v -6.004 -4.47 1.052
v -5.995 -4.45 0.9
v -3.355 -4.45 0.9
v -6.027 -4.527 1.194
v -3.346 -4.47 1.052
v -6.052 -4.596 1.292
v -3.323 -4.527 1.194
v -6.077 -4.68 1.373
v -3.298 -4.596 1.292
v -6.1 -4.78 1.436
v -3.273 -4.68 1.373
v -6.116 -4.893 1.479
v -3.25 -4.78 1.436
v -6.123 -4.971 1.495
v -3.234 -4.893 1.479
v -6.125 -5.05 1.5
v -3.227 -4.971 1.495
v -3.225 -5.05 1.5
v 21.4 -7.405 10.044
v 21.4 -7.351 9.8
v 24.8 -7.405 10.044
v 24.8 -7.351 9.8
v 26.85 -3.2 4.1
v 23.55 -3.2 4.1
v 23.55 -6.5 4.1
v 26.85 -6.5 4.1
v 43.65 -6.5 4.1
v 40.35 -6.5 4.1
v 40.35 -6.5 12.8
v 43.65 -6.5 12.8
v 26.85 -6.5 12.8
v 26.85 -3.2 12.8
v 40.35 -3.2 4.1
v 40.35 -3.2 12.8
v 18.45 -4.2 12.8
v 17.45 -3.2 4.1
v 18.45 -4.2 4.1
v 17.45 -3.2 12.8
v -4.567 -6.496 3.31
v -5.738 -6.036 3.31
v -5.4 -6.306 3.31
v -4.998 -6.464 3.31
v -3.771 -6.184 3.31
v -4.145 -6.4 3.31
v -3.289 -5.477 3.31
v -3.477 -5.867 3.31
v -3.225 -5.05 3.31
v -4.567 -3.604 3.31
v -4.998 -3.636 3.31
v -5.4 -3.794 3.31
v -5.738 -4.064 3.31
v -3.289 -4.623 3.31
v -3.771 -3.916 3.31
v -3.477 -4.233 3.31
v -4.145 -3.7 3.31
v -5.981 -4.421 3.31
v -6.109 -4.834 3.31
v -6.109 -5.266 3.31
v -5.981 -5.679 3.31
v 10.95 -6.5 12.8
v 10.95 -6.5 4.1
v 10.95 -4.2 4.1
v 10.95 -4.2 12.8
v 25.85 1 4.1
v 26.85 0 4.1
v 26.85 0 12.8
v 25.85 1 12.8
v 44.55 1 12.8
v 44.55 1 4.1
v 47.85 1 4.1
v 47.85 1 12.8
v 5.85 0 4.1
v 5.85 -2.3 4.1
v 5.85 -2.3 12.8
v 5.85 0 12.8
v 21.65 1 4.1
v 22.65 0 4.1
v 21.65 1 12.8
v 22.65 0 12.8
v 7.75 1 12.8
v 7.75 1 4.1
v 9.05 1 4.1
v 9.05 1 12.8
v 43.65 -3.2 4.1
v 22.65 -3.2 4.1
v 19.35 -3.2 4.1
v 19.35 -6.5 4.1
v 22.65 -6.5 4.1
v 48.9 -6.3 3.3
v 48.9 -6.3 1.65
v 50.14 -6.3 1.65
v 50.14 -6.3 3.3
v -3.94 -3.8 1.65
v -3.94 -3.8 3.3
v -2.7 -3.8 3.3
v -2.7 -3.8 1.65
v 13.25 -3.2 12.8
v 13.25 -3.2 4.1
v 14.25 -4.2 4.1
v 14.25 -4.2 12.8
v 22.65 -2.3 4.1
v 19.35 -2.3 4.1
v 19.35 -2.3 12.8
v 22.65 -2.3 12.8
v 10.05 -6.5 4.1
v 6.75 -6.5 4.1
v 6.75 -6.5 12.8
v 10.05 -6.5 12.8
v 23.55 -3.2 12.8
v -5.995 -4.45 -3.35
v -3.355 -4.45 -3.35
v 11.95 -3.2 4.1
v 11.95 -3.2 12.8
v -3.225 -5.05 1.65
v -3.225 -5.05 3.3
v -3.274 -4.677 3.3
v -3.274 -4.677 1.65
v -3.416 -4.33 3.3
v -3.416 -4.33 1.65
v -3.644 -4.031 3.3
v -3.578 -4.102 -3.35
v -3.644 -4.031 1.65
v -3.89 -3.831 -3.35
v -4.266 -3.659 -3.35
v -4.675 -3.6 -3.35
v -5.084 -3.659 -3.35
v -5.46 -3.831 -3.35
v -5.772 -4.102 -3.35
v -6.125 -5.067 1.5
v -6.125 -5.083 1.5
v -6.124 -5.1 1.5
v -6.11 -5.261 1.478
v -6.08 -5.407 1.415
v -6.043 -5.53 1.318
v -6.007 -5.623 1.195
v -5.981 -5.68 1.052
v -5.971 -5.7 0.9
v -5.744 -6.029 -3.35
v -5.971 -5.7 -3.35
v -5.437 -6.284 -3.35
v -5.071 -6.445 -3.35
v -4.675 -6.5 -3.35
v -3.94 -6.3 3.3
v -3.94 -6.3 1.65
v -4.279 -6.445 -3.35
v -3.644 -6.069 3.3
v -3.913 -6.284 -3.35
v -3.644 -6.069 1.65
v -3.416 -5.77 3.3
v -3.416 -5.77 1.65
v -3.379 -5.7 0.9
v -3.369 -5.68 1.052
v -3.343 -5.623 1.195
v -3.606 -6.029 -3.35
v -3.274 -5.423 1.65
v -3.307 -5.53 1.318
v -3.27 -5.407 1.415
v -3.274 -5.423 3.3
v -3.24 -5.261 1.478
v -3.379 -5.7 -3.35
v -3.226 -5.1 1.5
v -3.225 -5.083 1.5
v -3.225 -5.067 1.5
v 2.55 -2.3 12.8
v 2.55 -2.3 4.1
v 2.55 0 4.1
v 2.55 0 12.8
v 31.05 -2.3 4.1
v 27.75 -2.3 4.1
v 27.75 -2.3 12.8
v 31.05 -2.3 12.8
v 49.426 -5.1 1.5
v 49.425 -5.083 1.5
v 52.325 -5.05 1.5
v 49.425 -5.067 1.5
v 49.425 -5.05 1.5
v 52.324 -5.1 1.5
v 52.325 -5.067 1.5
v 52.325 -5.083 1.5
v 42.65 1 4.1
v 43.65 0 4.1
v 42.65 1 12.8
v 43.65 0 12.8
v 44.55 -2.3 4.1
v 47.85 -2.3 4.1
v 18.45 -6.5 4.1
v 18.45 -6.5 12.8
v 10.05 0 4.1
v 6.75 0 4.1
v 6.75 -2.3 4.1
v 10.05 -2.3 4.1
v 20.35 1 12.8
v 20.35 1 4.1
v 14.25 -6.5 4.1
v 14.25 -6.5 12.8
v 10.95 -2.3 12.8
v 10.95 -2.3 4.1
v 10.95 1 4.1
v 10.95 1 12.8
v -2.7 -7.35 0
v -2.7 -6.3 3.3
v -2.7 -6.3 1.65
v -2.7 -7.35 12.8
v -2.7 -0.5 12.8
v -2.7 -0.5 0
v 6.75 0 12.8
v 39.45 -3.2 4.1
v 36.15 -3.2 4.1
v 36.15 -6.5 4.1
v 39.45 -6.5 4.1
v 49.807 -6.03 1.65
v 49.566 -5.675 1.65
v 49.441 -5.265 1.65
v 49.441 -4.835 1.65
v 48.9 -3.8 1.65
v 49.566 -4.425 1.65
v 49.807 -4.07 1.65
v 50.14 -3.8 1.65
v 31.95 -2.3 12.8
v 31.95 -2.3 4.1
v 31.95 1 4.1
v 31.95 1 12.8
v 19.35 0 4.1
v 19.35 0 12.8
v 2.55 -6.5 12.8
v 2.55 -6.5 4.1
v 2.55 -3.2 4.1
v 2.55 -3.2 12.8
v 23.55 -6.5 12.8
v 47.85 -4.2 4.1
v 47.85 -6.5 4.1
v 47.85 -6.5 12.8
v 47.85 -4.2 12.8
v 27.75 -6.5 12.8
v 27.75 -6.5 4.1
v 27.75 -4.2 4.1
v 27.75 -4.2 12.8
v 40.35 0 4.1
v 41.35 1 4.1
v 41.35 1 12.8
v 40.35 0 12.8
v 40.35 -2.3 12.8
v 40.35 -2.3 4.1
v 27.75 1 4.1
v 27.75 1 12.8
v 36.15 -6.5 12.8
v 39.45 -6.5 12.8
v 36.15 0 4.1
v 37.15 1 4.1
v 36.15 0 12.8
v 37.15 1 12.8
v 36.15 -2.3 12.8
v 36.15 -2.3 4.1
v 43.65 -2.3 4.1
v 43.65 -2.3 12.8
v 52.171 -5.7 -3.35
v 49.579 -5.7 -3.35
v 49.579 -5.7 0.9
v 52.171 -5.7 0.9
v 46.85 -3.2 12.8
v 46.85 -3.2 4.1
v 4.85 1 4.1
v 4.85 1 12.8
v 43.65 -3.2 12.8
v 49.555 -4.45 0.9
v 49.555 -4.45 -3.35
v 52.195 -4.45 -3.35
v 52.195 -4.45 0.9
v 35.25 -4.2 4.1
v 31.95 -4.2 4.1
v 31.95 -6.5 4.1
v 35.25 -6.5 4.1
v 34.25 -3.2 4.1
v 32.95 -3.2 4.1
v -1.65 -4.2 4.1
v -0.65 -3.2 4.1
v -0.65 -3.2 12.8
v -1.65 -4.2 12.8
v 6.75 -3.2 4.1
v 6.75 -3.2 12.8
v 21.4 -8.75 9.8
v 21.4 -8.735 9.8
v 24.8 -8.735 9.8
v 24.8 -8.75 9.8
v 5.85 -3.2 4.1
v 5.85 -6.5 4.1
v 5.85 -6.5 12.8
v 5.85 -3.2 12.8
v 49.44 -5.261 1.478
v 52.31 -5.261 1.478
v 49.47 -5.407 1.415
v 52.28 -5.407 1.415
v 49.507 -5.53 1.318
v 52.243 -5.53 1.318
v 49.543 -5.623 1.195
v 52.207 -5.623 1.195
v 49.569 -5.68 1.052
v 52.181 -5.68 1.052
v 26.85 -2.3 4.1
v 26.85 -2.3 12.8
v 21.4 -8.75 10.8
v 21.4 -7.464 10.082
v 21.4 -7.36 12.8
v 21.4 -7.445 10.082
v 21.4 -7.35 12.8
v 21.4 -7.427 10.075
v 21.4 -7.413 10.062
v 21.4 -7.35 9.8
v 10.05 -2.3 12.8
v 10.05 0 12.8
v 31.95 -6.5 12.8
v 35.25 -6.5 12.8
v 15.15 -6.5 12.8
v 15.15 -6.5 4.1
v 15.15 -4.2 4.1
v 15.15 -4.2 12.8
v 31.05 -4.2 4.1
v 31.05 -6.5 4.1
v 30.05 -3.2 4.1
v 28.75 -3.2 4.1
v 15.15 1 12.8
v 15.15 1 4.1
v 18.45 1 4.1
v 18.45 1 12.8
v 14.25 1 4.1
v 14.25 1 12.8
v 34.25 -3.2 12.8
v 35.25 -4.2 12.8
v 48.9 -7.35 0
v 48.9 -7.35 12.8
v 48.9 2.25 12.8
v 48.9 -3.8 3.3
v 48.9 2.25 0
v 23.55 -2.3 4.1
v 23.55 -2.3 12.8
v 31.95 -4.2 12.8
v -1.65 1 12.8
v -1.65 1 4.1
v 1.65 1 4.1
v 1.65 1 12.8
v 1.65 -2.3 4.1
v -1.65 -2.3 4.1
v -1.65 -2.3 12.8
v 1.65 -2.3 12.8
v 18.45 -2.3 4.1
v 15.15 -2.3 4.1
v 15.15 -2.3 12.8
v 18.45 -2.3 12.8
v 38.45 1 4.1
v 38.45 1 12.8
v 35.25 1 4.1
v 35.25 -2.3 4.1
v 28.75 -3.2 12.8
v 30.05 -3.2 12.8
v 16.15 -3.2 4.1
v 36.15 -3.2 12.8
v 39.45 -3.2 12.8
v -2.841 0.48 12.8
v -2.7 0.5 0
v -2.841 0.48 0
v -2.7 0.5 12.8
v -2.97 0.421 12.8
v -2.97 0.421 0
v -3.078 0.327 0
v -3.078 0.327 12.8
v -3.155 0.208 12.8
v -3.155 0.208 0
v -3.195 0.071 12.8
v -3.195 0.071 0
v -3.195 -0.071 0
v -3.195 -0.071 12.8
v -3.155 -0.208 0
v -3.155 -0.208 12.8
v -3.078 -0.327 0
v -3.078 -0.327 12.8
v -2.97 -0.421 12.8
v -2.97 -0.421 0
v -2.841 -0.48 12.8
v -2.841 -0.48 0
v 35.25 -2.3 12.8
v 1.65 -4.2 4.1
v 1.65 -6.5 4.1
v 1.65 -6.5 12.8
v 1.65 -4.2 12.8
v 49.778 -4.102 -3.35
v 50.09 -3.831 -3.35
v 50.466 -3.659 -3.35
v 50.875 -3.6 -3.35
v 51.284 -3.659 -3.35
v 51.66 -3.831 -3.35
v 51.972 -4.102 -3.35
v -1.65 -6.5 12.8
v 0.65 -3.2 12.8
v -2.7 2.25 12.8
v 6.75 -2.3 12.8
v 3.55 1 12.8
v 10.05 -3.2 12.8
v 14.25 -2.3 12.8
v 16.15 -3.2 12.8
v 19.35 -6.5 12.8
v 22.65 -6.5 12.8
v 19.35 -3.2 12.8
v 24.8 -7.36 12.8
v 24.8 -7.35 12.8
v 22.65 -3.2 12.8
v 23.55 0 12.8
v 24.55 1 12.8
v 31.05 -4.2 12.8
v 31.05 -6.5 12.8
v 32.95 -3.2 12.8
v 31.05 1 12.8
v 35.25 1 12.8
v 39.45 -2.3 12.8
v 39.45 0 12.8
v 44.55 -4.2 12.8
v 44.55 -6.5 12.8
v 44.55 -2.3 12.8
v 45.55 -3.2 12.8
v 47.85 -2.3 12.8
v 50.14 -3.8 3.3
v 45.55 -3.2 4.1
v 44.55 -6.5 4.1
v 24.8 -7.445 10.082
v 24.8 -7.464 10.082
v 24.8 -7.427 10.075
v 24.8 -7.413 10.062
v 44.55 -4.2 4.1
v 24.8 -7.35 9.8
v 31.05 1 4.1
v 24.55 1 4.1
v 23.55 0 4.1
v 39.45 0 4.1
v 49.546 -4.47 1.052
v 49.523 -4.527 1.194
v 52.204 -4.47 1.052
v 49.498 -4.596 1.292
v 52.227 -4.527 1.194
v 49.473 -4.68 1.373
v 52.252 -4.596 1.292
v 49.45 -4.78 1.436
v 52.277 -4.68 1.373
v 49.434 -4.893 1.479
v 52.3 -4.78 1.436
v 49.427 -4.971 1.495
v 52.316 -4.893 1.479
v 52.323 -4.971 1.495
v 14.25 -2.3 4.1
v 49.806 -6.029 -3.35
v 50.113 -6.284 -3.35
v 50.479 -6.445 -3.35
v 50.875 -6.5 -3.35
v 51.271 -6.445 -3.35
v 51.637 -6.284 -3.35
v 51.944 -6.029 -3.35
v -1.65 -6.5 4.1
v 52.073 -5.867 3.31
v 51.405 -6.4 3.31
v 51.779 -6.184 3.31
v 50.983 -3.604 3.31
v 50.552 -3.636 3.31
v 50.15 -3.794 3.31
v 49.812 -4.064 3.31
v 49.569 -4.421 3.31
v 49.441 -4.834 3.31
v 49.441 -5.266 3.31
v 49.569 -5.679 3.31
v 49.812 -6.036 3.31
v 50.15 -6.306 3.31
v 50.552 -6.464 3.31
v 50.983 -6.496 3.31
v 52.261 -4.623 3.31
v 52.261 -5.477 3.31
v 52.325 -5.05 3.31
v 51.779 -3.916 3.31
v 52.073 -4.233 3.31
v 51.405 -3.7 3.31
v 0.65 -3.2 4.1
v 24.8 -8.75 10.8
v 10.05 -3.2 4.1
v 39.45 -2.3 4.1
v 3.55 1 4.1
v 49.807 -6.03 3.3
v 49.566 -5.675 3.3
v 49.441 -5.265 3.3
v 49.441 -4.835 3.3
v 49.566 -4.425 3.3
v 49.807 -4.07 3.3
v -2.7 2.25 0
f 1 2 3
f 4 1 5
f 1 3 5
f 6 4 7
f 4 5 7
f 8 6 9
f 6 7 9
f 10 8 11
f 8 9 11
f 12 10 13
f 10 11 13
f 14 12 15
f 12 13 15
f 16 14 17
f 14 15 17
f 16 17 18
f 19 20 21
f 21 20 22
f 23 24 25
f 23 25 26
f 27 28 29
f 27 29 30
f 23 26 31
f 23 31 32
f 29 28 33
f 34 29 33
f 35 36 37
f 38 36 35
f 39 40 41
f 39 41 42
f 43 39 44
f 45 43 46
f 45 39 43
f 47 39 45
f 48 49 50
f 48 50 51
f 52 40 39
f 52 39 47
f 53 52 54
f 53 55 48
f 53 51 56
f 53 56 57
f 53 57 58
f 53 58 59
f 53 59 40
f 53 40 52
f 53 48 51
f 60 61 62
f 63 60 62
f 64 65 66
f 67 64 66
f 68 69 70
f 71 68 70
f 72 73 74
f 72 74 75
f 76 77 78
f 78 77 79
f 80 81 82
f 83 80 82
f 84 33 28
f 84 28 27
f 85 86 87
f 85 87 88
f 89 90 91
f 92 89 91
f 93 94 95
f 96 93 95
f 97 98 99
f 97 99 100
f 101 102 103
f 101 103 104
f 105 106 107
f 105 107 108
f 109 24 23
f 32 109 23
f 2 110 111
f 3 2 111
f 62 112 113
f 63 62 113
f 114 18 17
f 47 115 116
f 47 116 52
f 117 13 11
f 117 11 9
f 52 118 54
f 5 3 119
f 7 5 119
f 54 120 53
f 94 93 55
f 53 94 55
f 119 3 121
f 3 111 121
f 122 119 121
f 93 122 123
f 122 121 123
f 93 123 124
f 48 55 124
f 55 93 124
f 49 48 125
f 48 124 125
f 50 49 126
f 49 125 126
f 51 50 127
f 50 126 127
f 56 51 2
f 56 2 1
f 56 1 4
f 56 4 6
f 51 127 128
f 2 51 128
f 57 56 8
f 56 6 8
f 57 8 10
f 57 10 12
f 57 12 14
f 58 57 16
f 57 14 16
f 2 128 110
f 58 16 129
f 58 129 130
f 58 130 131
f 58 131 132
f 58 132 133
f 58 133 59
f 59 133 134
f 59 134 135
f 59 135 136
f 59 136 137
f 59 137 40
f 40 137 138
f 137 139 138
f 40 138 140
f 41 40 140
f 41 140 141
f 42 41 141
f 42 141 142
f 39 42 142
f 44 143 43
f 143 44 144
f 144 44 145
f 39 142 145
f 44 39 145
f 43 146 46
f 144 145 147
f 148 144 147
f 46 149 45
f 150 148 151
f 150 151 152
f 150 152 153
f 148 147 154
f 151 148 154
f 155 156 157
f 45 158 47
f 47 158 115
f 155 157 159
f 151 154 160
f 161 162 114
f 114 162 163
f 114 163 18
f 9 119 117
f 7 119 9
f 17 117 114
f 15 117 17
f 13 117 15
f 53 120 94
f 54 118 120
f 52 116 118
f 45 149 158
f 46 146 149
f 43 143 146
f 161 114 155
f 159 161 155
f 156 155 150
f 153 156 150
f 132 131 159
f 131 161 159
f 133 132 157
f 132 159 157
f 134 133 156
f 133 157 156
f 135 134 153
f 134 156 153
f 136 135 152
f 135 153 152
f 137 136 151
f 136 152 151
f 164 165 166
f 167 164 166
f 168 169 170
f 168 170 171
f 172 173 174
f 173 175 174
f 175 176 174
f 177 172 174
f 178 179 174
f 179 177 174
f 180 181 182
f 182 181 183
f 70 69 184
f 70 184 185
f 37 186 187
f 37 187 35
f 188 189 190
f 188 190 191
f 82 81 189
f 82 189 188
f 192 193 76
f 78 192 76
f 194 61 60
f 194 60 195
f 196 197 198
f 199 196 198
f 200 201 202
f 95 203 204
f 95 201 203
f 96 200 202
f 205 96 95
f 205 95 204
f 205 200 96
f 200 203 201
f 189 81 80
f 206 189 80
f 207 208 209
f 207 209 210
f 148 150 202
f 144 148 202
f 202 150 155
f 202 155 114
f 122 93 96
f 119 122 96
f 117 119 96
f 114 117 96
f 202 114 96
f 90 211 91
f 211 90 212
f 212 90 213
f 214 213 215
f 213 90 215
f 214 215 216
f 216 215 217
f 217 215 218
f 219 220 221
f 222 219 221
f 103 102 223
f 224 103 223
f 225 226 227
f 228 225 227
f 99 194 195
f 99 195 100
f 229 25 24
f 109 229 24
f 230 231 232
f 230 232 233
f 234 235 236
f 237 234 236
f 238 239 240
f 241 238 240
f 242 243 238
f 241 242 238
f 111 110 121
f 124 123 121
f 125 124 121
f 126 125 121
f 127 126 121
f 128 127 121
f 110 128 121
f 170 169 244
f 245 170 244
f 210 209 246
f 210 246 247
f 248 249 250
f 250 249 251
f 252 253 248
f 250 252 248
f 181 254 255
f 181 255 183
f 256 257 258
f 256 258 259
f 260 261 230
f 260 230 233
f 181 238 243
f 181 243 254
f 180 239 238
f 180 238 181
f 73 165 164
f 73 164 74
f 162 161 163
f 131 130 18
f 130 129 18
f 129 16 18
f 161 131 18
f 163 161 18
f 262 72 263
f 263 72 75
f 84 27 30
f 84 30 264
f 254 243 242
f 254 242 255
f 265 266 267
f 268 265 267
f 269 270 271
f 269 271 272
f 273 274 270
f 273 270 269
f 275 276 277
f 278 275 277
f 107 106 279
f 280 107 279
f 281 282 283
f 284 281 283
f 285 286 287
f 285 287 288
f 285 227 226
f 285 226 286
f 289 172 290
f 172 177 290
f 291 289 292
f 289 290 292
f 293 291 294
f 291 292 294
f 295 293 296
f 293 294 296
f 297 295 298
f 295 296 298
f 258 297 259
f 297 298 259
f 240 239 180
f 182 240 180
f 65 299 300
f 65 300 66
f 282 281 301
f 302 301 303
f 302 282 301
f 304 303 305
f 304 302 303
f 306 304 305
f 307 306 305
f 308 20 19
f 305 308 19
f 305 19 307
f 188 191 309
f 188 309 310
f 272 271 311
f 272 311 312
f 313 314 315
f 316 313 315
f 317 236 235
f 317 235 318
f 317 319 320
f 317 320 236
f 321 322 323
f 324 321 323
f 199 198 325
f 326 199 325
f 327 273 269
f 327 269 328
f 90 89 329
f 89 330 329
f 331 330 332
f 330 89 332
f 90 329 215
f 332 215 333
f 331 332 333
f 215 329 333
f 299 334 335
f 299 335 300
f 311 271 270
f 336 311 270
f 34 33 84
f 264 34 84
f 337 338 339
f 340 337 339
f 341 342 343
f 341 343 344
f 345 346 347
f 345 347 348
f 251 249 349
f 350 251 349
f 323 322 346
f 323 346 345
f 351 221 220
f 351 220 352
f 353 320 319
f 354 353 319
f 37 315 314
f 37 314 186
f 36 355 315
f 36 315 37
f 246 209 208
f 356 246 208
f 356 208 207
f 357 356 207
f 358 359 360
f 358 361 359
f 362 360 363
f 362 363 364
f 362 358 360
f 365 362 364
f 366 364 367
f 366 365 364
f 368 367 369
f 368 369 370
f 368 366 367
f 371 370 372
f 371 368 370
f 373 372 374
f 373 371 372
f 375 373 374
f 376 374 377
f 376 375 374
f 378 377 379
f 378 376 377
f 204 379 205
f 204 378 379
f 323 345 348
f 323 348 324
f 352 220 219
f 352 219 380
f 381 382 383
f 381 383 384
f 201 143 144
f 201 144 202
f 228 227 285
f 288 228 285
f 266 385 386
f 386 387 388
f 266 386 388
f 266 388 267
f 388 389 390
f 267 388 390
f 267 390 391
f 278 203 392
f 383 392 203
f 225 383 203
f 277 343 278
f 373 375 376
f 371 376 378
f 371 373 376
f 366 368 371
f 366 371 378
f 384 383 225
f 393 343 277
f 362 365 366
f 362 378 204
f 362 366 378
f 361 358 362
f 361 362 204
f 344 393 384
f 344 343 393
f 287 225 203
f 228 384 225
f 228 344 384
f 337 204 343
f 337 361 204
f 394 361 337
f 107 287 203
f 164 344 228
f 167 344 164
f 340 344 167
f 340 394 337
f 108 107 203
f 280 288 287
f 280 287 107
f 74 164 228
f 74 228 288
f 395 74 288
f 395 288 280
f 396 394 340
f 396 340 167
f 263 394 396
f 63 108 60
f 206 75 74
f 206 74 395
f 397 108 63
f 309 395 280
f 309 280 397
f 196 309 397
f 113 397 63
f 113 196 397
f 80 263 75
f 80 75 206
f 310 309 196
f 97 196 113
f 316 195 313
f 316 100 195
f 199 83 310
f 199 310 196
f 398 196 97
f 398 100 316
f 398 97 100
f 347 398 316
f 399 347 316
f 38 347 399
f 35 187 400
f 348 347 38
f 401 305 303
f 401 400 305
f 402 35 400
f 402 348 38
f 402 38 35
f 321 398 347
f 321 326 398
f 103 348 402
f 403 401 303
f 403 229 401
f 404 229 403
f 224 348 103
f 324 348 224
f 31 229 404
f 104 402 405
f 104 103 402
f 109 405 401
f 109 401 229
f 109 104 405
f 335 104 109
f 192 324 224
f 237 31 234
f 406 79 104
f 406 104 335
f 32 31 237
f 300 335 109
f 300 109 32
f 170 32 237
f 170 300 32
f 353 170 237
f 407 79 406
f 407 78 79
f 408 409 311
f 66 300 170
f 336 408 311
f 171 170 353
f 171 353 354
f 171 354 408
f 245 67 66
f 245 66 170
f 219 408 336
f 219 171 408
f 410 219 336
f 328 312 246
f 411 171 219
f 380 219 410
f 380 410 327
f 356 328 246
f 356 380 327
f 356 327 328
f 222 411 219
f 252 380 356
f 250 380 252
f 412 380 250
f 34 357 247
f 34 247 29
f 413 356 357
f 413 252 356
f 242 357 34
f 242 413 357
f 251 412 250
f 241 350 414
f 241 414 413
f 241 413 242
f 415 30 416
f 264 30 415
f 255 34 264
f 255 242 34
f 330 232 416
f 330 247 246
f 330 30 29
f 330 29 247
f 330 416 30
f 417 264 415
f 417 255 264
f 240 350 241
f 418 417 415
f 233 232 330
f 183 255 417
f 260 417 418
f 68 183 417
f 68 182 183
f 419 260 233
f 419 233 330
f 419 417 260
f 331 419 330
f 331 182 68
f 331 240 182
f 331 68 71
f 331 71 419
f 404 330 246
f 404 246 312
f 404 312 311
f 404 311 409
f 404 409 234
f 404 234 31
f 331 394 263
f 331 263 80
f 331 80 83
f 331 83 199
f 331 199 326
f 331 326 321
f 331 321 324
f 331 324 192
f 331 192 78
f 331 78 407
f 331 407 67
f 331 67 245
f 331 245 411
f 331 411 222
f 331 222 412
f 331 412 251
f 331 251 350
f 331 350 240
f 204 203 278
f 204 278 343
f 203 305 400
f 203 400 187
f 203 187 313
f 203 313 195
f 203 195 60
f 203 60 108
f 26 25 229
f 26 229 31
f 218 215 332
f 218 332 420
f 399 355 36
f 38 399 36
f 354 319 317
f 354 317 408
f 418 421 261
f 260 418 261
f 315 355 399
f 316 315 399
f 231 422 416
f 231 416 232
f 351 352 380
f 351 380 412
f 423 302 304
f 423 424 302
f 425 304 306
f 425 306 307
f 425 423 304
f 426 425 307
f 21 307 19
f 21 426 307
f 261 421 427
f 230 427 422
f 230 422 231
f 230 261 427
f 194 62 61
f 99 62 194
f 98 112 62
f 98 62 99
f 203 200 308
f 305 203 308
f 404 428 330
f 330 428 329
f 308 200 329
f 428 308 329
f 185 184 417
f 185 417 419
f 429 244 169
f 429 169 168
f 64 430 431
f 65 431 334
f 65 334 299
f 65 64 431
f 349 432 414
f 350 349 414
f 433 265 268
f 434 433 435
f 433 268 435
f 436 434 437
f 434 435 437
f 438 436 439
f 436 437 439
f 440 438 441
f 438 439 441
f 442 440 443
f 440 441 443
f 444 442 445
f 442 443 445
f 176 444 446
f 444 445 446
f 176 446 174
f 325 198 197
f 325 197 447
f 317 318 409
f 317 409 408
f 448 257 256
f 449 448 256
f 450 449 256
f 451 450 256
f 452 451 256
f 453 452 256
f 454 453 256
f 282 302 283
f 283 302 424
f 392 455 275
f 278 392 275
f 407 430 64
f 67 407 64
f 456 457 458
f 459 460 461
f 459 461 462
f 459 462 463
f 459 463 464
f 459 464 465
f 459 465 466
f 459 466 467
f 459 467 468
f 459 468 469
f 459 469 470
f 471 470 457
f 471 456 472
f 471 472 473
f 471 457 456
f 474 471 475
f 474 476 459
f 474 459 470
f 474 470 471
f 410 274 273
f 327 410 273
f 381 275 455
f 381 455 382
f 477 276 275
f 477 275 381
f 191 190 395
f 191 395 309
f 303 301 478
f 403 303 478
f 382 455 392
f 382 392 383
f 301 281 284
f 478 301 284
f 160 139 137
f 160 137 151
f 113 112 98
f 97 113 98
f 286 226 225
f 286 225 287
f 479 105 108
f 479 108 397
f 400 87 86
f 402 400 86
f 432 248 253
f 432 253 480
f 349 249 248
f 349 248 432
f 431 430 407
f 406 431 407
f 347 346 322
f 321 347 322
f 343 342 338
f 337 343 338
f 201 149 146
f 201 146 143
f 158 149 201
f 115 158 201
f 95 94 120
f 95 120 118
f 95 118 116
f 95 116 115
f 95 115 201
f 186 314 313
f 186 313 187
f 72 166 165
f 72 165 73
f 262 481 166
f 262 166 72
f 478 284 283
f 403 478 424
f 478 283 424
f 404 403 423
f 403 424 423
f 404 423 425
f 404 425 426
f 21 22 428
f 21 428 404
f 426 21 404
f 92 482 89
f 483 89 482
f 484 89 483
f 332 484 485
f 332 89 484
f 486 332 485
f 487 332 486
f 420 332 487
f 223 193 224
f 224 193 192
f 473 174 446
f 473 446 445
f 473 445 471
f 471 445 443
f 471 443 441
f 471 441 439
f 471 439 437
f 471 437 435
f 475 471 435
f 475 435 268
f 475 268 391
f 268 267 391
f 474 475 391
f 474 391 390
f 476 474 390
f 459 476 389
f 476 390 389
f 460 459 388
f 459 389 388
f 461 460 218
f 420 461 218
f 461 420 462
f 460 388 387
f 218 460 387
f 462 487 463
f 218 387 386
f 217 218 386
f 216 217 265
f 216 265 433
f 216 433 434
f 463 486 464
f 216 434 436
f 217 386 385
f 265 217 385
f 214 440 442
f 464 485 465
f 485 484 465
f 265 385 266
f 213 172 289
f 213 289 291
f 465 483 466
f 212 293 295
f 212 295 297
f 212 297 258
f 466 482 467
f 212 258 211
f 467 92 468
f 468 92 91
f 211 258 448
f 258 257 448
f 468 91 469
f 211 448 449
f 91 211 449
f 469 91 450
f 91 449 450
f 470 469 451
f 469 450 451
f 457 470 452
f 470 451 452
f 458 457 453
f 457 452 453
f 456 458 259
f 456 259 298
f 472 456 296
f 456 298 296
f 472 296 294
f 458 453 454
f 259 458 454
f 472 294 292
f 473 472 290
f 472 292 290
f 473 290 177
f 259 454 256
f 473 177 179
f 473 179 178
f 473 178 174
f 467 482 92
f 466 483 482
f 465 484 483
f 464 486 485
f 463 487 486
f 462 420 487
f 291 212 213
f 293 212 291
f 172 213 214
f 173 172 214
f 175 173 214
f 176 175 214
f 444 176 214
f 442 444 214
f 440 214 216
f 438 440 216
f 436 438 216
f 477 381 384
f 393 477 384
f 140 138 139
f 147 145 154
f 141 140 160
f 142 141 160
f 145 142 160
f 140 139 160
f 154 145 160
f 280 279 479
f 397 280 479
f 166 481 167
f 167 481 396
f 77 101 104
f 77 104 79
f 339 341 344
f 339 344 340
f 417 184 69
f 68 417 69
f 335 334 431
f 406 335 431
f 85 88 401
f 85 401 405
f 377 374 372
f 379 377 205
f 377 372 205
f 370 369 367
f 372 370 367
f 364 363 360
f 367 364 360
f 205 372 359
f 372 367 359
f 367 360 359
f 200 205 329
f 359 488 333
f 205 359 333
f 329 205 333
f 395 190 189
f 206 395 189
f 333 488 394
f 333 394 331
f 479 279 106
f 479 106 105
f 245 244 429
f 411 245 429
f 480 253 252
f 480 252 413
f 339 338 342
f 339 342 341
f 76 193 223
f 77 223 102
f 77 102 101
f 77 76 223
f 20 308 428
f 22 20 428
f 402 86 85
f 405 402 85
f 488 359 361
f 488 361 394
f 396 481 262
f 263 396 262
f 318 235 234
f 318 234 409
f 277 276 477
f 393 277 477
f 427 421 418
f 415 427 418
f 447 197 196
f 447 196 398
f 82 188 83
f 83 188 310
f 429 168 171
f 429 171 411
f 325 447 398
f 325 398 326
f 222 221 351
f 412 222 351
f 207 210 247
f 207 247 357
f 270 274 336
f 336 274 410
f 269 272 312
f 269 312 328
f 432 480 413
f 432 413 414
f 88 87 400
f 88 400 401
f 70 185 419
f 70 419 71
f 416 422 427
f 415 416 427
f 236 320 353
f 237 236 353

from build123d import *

# Parameters (mm, degrees)
BOX_W                  = 51.6
BOX_H                  = 9.6
BOX_DEPTH              = 12.8
BOX001_W               = 3.4
BOX001_H               = 1.4
BOX001_DEPTH           = 3
CHAMFER_SIZE2          = 2
CHAMFER_SIZE           = 1.39
BOX002_W               = 3.4
BOX002_H               = 1.5
BOX002_DEPTH           = 0.3
FILLET_R               = 0.05
BOX006_W               = 1.5
BOX006_H               = 2.5
BOX006_DEPTH           = 1.65
CYLINDER_R             = 1.45
CYLINDER_DEPTH         = 6.66
BOX007_W               = 1.5
BOX007_H               = 2.5
BOX007_DEPTH           = 1.65
CYLINDER001_R          = 1.45
CYLINDER001_DEPTH      = 6.66
BOX003_W               = 3.3
BOX003_H               = 3.3
BOX003_DEPTH           = 8.75
LINEARPATTERN_COUNT    = 12
LINEARPATTERN_PITCH    = 4.2
BOX008_W               = 3.3
BOX008_H               = 3.3
BOX008_DEPTH           = 8.75
LINEARPATTERN001_COUNT = 12
LINEARPATTERN001_PITCH = 4.2
CHAMFER001_SIZE        = 1
CYLINDER002_W          = 0.5
CYLINDER002_H          = 12.8
CYLINDER002_ANGLE      = 180
BOX009_W               = 3
BOX009_H               = 1.25
BOX009_DEPTH           = 5
LINEARPATTERN002_COUNT = 2
LINEARPATTERN002_PITCH = 55.54
FILLET001_R            = 0.6


with BuildPart() as part:
    # Box → Box (join)
    with BuildSketch(Plane(origin=(-2.7, -7.35, 0), x_dir=(1, 0, 0), z_dir=(0, 0, 1))):
        with Locations((25.8, 4.8)):
            Rectangle(BOX_W, BOX_H)
    extrude(amount=BOX_DEPTH)

    # Box001 → Box001 (join)
    with BuildSketch(Plane(origin=(21.4, -8.75, 9.8), x_dir=(1, 0, 0), z_dir=(0, 0, 1))):
        with Locations((1.7, 0.7)):
            Rectangle(BOX001_W, BOX001_H)
    extrude(amount=BOX001_DEPTH)

    # Chamfer
    chamfer_edges = [part.edges().sort_by_distance(p)[0] for p in [
        (23.1, -8.75, 12.8),
    ]]
    chamfer_side = part.faces().sort_by_distance((23.1, -8.05, 12.8))[0]
    chamfer(chamfer_edges, length=CHAMFER_SIZE, length2=CHAMFER_SIZE2, reference=chamfer_side)

    # Box002 → Box002 (cut)
    with BuildSketch(Plane(origin=(21.4, -8.815, 9.475), x_dir=(1, 0, 0), z_dir=(0, -0.21644, 0.976296))):
        with Locations((1.7, 0.75)):
            Rectangle(BOX002_W, BOX002_H)
    extrude(amount=BOX002_DEPTH, mode=Mode.SUBTRACT)

    # Fillet
    fillet_edges = [part.edges().sort_by_distance(p)[0] for p in [
        (23.1, -7.415488, 10.092548),
    ]]
    fillet(fillet_edges, radius=FILLET_R)

    # Box006 → Box006 (join)
    with BuildSketch(Plane(origin=(-4.2, -6.3, 1.65), x_dir=(1, 0, 0), z_dir=(0, 0, 1))):
        with Locations((0.75, 1.25)):
            Rectangle(BOX006_W, BOX006_H)
    extrude(amount=BOX006_DEPTH)

    # Cylinder → Cylinder (join)
    with BuildSketch(Plane(origin=(-4.675, -5.05, -3.35), x_dir=(1, 0, 0), z_dir=(0, 0, 1))):
        Circle(CYLINDER_R)
    extrude(amount=CYLINDER_DEPTH)

    # Box007 → Box007 (join)
    with BuildSketch(Plane(origin=(48.9, -6.3, 1.65), x_dir=(1, 0, 0), z_dir=(0, 0, 1))):
        with Locations((0.75, 1.25)):
            Rectangle(BOX007_W, BOX007_H)
    extrude(amount=BOX007_DEPTH)

    # Cylinder001 → Cylinder001 (join)
    with BuildSketch(Plane(origin=(50.875, -5.05, -3.35), x_dir=(1, 0, 0), z_dir=(0, 0, 1))):
        Circle(CYLINDER001_R)
    extrude(amount=CYLINDER001_DEPTH)

    # Box003 → Box003 (cut)
    with BuildSketch(Plane(origin=(-1.65, -2.3, 4.1), x_dir=(1, 0, 0), z_dir=(0, 0, 1))):
        with Locations((1.65, 1.65)):
            Rectangle(BOX003_W, BOX003_H)
    box003 = extrude(amount=BOX003_DEPTH, mode=Mode.SUBTRACT)

    # LinearPattern: Box003 ×12
    with Locations(*[(i * LINEARPATTERN_PITCH, 0, 0) for i in range(1, LINEARPATTERN_COUNT)]):
        add(box003, mode=Mode.SUBTRACT)

    # Box008 → Box008 (cut)
    with BuildSketch(Plane(origin=(-1.65, -6.5, 4.1), x_dir=(1, 0, 0), z_dir=(0, 0, 1))):
        with Locations((1.65, 1.65)):
            Rectangle(BOX008_W, BOX008_H)
    box008 = extrude(amount=BOX008_DEPTH, mode=Mode.SUBTRACT)

    # LinearPattern001: Box008 ×12
    with Locations(*[(i * LINEARPATTERN001_PITCH, 0, 0) for i in range(1, LINEARPATTERN001_COUNT)]):
        add(box008, mode=Mode.SUBTRACT)

    # Chamfer001
    chamfer001_edges = [part.edges().sort_by_distance(p)[0] for p in [
        (2.55, 1, 8.45),
        (-1.65, -3.2, 8.45),
        (5.85, 1, 8.45),
        (1.65, -3.2, 8.45),
        (14.25, -3.2, 8.45),
        (10.95, -3.2, 8.45),
        (31.95, -3.2, 8.45),
        (40.35, 1, 8.45),
        (36.15, 1, 8.45),
        (47.85, -3.2, 8.45),
        (43.65, 1, 8.45),
        (44.55, -3.2, 8.45),
        (18.45, -3.2, 8.45),
        (15.15, -3.2, 8.45),
        (6.75, 1, 8.45),
        (10.05, 1, 8.45),
        (39.45, 1, 8.45),
        (35.25, -3.2, 8.45),
        (31.05, -3.2, 8.45),
        (27.75, -3.2, 8.45),
        (26.85, 1, 8.45),
        (23.55, 1, 8.45),
        (22.65, 1, 8.45),
        (19.35, 1, 8.45),
    ]]
    chamfer(chamfer001_edges, length=CHAMFER001_SIZE)

    # Cylinder002 → Cylinder002 (revolve)
    with BuildSketch(Plane.YZ.offset(-2.7)):
        with Locations((0.25, 6.4)):
            Rectangle(CYLINDER002_W, CYLINDER002_H)
    revolve(axis=Axis((-2.7, 0, 0), (0, 0, 1)), revolution_arc=CYLINDER002_ANGLE)

    # Box009 → Box009 (cut)
    with BuildSketch(Plane(origin=(-6.2, -5.7, -3.5), x_dir=(1, 0, 0), z_dir=(0, 0, 1))):
        with Locations((1.5, 0.625)):
            Rectangle(BOX009_W, BOX009_H)
    box009 = extrude(amount=BOX009_DEPTH, mode=Mode.SUBTRACT)

    # LinearPattern002: Box009 ×2
    with Locations(*[(i * LINEARPATTERN002_PITCH, 0, 0) for i in range(1, LINEARPATTERN002_COUNT)]):
        add(box009, mode=Mode.SUBTRACT)

    # Fillet001
    fillet001_edges = [part.edges().sort_by_distance(p)[0] for p in [
        (50.875, -5.7, 1.5),
        (50.875, -4.45, 1.5),
        (-4.675, -5.7, 1.5),
        (-4.675, -4.45, 1.5),
    ]]
    fillet(fillet001_edges, radius=FILLET001_R)


solid = part.part
